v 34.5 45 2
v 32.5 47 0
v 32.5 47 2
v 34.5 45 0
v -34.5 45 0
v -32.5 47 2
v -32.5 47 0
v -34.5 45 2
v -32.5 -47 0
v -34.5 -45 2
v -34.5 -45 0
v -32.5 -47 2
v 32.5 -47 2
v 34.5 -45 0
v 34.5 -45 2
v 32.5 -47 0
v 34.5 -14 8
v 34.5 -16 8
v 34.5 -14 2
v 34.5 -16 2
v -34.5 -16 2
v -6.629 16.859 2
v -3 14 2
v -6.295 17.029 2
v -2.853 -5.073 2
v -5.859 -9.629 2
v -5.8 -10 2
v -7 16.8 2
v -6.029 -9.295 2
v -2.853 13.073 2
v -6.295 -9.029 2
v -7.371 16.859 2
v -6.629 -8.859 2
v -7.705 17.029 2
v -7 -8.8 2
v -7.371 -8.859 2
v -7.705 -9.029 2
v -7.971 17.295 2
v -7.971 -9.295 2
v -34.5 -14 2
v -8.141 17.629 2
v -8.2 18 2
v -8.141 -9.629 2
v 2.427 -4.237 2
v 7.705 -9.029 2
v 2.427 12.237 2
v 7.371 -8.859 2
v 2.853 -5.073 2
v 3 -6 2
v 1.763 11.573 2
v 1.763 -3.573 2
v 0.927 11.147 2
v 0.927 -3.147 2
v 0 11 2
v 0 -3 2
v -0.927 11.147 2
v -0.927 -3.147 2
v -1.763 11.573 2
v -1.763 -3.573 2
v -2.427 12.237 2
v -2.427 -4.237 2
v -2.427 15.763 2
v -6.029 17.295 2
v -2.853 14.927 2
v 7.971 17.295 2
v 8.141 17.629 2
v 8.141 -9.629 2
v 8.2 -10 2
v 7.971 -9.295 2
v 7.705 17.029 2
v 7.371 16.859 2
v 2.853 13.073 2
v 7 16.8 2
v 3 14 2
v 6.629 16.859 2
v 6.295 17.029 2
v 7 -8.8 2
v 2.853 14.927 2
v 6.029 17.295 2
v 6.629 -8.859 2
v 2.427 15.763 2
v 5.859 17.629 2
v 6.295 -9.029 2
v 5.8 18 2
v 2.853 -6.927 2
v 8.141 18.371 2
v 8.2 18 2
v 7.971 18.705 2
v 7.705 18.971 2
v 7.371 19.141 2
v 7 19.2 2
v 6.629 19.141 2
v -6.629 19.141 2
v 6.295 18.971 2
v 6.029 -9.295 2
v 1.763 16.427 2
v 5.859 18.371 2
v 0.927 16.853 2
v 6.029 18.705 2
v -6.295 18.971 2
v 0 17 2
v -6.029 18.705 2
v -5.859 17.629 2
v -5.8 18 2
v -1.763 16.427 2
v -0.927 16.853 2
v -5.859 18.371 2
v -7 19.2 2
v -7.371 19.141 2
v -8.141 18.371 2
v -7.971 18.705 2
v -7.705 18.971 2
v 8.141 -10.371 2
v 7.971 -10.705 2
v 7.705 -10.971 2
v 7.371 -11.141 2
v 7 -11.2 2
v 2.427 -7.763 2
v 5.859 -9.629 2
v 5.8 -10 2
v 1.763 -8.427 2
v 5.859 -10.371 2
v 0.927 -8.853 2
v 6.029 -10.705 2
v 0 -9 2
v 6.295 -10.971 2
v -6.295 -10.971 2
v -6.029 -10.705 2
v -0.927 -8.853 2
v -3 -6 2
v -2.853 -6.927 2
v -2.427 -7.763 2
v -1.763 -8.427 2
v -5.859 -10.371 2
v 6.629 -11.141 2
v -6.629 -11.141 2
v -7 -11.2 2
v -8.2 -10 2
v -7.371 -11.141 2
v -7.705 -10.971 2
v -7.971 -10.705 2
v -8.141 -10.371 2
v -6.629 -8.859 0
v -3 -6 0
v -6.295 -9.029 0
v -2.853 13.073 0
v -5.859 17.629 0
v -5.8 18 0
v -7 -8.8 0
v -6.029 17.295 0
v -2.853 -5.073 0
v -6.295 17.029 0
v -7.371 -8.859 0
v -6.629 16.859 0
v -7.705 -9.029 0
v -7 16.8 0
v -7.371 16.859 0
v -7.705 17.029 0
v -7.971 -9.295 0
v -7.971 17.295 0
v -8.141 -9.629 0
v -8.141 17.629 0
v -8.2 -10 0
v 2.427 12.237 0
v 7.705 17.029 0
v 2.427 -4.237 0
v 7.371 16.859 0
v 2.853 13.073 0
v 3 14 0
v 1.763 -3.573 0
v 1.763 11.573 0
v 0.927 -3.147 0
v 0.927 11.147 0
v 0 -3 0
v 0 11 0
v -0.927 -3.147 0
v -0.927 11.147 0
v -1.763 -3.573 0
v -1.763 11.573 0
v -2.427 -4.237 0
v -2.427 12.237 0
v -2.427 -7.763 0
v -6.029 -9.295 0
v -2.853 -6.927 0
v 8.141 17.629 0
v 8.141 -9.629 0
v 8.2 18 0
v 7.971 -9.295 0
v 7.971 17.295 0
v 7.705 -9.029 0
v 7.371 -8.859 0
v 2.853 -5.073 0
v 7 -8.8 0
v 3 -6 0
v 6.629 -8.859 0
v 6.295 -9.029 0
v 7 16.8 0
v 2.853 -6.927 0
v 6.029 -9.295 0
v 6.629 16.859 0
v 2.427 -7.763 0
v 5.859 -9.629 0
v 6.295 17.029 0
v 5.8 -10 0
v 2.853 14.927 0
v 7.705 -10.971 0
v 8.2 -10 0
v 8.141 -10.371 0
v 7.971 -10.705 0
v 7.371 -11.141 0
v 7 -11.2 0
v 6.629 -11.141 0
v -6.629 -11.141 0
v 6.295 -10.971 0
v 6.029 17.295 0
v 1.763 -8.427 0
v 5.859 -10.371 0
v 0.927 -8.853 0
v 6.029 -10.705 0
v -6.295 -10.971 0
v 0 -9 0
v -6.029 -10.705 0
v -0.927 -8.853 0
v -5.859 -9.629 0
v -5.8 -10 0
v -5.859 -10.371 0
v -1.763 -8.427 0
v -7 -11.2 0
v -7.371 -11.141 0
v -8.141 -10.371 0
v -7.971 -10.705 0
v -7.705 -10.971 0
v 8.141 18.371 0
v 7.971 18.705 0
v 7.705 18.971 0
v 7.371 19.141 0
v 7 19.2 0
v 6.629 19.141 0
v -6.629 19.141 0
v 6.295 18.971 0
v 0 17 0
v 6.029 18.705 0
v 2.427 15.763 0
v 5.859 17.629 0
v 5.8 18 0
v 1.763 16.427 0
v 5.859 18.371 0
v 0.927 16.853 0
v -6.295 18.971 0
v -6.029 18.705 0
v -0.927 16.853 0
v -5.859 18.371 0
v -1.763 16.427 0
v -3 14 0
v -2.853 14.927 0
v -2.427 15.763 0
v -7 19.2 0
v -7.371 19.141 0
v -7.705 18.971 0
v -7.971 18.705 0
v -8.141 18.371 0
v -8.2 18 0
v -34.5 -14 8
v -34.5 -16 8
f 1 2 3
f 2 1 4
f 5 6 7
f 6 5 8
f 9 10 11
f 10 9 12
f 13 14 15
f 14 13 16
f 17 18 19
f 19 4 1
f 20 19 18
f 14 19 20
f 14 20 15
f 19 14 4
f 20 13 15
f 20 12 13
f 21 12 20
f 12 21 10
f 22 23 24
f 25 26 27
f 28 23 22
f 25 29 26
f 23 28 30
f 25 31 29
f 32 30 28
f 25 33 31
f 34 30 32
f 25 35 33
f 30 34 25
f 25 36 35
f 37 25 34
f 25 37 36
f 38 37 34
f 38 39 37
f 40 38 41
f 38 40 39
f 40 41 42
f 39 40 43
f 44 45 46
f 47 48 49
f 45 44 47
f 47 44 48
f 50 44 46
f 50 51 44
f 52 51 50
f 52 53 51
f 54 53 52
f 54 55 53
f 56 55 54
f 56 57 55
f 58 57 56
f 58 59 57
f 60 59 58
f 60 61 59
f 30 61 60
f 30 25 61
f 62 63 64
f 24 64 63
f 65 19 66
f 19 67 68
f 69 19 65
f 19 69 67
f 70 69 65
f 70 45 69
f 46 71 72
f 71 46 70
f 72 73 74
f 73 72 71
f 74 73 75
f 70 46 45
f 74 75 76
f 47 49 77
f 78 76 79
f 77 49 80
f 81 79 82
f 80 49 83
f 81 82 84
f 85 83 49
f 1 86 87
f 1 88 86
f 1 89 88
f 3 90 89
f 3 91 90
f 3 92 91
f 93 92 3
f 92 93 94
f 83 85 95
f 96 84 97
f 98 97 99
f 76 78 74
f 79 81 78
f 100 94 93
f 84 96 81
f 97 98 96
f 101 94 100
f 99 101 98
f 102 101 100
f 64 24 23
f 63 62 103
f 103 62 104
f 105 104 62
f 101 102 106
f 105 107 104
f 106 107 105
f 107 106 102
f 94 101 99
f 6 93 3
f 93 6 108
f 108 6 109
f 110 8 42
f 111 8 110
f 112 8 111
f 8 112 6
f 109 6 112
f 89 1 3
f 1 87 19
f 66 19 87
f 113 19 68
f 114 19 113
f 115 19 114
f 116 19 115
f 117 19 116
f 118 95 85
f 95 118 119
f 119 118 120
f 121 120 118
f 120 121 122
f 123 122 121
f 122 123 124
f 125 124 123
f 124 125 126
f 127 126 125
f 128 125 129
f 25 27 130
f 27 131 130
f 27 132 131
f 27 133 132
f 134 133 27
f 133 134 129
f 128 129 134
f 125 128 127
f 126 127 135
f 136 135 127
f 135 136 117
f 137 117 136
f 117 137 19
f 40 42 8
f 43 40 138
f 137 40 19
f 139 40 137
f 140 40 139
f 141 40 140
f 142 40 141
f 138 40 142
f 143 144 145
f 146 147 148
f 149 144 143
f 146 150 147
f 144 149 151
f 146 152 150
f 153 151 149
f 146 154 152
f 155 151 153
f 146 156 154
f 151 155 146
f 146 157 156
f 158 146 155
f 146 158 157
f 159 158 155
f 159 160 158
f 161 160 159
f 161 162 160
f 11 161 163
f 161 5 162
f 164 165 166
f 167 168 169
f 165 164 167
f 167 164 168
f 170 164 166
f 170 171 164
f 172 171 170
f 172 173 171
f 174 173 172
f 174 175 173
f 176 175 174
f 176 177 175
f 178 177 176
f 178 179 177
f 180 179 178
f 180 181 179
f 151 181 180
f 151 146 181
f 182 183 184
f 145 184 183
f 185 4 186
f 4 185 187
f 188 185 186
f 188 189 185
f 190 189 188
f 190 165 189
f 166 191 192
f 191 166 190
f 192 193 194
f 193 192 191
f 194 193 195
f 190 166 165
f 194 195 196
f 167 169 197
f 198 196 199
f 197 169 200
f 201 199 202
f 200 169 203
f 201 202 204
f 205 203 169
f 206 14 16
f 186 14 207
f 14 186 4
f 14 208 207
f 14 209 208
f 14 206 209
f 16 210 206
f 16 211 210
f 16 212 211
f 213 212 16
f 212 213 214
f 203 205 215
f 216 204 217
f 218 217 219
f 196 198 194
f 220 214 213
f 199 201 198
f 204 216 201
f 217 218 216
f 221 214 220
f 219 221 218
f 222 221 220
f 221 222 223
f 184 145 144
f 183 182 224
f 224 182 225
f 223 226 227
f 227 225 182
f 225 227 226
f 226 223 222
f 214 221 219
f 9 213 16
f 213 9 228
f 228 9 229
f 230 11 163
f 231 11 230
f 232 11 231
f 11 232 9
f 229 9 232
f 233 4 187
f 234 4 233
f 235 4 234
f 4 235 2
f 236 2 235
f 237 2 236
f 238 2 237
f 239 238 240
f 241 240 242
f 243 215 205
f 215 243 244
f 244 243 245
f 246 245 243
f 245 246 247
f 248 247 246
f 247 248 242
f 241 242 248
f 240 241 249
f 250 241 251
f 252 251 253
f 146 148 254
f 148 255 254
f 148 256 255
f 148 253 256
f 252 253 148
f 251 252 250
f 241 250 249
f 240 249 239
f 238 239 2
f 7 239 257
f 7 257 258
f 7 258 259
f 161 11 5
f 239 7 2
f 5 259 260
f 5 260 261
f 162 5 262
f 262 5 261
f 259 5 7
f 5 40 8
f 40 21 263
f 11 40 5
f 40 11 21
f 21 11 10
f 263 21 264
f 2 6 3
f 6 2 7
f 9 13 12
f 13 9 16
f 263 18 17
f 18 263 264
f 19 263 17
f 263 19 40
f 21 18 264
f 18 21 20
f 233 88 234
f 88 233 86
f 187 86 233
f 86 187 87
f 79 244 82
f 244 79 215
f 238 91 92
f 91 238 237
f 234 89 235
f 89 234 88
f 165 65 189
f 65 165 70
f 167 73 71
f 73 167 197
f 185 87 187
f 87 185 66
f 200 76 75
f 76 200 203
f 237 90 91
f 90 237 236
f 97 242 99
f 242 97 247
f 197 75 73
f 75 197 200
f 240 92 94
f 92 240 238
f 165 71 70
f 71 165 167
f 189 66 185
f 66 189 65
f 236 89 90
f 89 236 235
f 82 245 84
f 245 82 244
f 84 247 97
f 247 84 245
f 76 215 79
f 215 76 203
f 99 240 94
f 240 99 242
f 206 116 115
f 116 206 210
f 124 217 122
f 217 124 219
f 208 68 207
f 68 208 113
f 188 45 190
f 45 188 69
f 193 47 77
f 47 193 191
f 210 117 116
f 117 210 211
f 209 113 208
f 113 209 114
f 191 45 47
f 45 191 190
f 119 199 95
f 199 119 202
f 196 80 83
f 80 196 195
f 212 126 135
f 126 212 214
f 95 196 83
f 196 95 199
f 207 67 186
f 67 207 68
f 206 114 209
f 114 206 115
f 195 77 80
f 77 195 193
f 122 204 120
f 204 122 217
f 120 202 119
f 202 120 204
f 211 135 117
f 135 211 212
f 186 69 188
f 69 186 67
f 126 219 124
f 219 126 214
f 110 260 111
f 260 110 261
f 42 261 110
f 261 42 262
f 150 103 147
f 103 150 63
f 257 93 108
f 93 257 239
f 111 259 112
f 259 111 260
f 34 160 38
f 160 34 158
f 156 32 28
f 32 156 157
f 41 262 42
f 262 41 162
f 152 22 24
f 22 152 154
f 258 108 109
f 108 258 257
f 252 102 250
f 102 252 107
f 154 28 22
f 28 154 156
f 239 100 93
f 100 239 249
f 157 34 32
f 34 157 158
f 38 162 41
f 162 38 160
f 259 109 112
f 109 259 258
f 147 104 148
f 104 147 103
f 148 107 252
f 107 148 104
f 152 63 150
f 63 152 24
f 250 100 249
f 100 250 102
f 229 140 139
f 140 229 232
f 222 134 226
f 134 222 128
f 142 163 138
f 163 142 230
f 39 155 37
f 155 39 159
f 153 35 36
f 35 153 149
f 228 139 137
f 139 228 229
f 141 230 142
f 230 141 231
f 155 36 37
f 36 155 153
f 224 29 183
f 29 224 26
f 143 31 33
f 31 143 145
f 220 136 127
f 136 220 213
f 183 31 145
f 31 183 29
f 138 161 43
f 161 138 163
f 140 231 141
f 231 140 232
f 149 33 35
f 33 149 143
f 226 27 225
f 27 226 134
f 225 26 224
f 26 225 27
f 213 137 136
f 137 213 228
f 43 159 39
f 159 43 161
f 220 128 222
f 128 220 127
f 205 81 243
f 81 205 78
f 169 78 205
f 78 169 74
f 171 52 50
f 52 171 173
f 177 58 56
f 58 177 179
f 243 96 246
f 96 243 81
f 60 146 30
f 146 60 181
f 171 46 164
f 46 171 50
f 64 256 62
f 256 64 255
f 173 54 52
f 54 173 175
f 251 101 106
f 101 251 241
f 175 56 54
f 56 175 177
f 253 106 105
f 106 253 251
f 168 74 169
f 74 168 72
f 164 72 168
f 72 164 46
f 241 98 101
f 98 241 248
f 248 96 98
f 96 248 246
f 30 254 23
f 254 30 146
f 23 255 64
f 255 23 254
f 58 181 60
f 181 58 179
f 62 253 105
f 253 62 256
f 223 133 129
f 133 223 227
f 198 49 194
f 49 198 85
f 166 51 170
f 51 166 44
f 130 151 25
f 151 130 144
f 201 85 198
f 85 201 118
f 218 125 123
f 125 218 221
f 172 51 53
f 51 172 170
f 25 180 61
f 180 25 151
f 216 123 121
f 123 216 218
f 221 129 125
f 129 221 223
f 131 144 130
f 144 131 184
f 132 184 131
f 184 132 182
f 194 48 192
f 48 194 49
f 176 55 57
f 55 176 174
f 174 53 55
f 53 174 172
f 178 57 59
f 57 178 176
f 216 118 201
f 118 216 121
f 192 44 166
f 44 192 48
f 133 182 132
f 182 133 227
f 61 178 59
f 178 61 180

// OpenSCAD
// file: base_objects.scad
/*

  base_objects.scad
  
  (c) olikraus@gmail.com

  This work is licensed under the Creative Commons Attribution-NonCommercial-ShareAlike 4.0 International License.
  To view a copy of this license, visit http://creativecommons.org/licenses/by-nc-sa/4.0/.

  SquareFrustum(bottom=[10,10], top=[0,0], h=10)
  CenterCube(dim, ChamferBody = 0, ChamferBottom=0, ChamferTop=0)
  Archoid(r=10, b=20, l=30)

*/


/*
  SquareFrustum(bottom=[10,10], top=[0,0], h=10)
  https://en.wikipedia.org/wiki/Frustum
  
  Args:
    buttom: Bottom square (width, height)
    top: Top square (width, height)
    h: Distance of the top square to z=0 plane
  Notes:
    The bottom square is placed in the z=0 plane.
    The squares are centered around z axis.
  Example:
    SquareFrustum([20,20], [10,4], h=20);
    

    // create a rectangle bowl
    // same example as for CenterCube
    // SquareFrustum might be more flexible because it is not
    // restricted to the 45 degree chamfer
    
    union() {
      wallthickness=2;
      xwidth = 10;
      ywidth = 20;
      height = 5;
      translate([0,0,wallthickness])
      difference() {
        CenterCube([xwidth+2*wallthickness,ywidth+2*wallthickness,5-wallthickness]);
        CenterCube([xwidth,ywidth,5-wallthickness+0.01]);
      }    
      SquareFrustum(
        bottom=[xwidth,ywidth], 
        top=[xwidth+2*wallthickness,ywidth+2*wallthickness], 
        h=wallthickness);
    }
    
*/
module SquareFrustum(bottom=[10,10], top=[0,0], h=10) {
  lx = bottom[0];
  ly = bottom[1];
  ux = top[0];
  uy = top[1];
  p = [
    [ -lx/2, -ly/2,  0 ],  //0
    [ lx/2,  -ly/2,  0 ],  //1
    [ lx/2,  ly/2,  0 ],  //2
    [ -lx/2,  ly/2,  0 ],  //3
    [ -ux/2, -uy/2,  h ],  //4
    [ ux/2,  -uy/2,  h ],  //5
    [ ux/2,  uy/2,  h ],  //6
    [ -ux/2,  uy/2,  h ]]; //7
    
  f = [
    [0,1,2,3],  // bottom
    [4,5,1,0],  // front
    [7,6,5,4],  // top
    [5,6,2,1],  // right
    [6,7,3,2],  // back
    [7,4,0,3]]; // left
  polyhedron( p, f );
}

/*
  ChamferZCube(w=1,h=10)

  A cube, which can be used to chamfer along the z axis

  Args:
    w: The width of the cube is sqrt(2)*w
    h: Height of the cube
    d: The cube has a descent below z=0 plane and an ascent beyond h by this value
  Notes:
    The cube is centered around z-axsis and placed on z=0 plane.

*/
module ChamferZCube(w=1,h=10, d=0) {
  translate([0,0,h/2])
  rotate([0,0,45])
  cube([sqrt(2)*w,sqrt(2)*w,h+2*d], center=true);
}

module ChamferXCube(w=1,h=10, d=0) {
  rotate([45,0,0])
  cube([h+2*d,sqrt(2)*w,sqrt(2)*w], center=true);
}

module ChamferYCube(w=1,h=10, d=0) {
  rotate([0,45,0])
  cube([sqrt(2)*w,h+2*d,sqrt(2)*w], center=true);
}

/*
  CenterCube(dim, ChamferBody = 0, ChamferBottom=0, ChamferTop=0)

  A cube which is centered along z axis but is placed on z=0 plane
  Optionally allows chamfer along z axis.

  Args:
    dim: Same as for cube(dim)
    ChamferBody: The amount to chamfer for edges parallel to z axis
    ChamferBottom: The amount to chamfer for edges in z=0 plane
    ChamferTop: The amount to chamfer for edges in z=dim[2] plane
  Example:
    CenterCube([10, 20, 5]);

    // create a rectangle bowl
    // thanks to chamfer no support is required with 3d print
    difference() {  
      wallthickness=2;
      xwidth = 10;
      ywidth = 20;
      height = 5;
      CenterCube( 
        [xwidth+2*wallthickness, ywidth+2*wallthickness, height], 
        ChamferBottom = wallthickness);
      translate([0,0,wallthickness])
      CenterCube([xwidth,ywidth,height]);
    }

*/

module CenterCube(dim, ChamferBody = 0, ChamferBottom=0, ChamferTop=0) {
  difference() {
    translate([0,0,dim[2]/2])
    cube(dim, center=true);

    if ( ChamferBody > 0 ) {
      translate([dim[0]/2,dim[1]/2,0])
      ChamferZCube(w=ChamferBody,h=dim[2],d=0.01);
      
      translate([-dim[0]/2,dim[1]/2,0])
      ChamferZCube(w=ChamferBody,h=dim[2],d=0.01);

      translate([-dim[0]/2,-dim[1]/2,0])
      ChamferZCube(w=ChamferBody,h=dim[2],d=0.01);

      translate([dim[0]/2,-dim[1]/2,0])
      ChamferZCube(w=ChamferBody,h=dim[2],d=0.01);
    }
    
    if ( ChamferBottom > 0 )
    {
      translate([-dim[0]/2,0,0])
      ChamferYCube(w=ChamferBottom,h=dim[1],d=0.01);

      translate([dim[0]/2,0,0])
      ChamferYCube(w=ChamferBottom,h=dim[1],d=0.01);

      translate([0,-dim[1]/2,0])
      ChamferXCube(w=ChamferBottom,h=dim[0],d=0.01);

      translate([0,dim[1]/2,0])
      ChamferXCube(w=ChamferBottom,h=dim[0],d=0.01);
    }
    
    if ( ChamferTop > 0 )
    {
      translate([-dim[0]/2,0,dim[2]])
      ChamferYCube(w=ChamferTop,h=dim[1],d=0.01);

      translate([dim[0]/2,0,dim[2]])
      ChamferYCube(w=ChamferTop,h=dim[1],d=0.01);

      translate([0,-dim[1]/2,dim[2]])
      ChamferXCube(w=ChamferTop,h=dim[0],d=0.01);

      translate([0,dim[1]/2,dim[2]])
      ChamferXCube(w=ChamferTop,h=dim[0],d=0.01);
    }
    
  }
}

/*
  Archoid(r=10, b=20, l=30)

  A chest like element with a half cylinder on the top
  and a box as a base.
  If used with difference, the result is a archway.

  Args:
    r: Radius of the half-cylinder
    b: height of the base block
    l: length of the chest in x direction.
    $fn: resolution of the half cylinder
  Notes:
    The width of the chest is 2*r, the height is b+r.
    Archoid(r=10, b=20, l=30, $fn=4) becomes a house.

*/
module Archoid(r=10, b=20, l=30) {
  union() {
    translate([0,0,b])
    difference() {
      rotate([0,90,0])
      cylinder(r=r,h=l,center=true);
      translate([0,0,-r])
      cube([2*l,2*l,2*r], center=true);
    }
    translate([0,0,b/2])
    cube([l,2*r,b+0.01], center=true);
  }
}
// main file
/*

  ccm_raspi_holder.scad
  
  (c) olikraus@gmail.com

  This work is licensed under the Creative Commons Attribution-NonCommercial-ShareAlike 4.0 International License.
  To view a copy of this license, visit http://creativecommons.org/licenses/by-nc-sa/4.0/.

  This is an extended scad file, not intended for 3d printing.

*/


include <card_compare_machine.scad>;

raspi_holder();
